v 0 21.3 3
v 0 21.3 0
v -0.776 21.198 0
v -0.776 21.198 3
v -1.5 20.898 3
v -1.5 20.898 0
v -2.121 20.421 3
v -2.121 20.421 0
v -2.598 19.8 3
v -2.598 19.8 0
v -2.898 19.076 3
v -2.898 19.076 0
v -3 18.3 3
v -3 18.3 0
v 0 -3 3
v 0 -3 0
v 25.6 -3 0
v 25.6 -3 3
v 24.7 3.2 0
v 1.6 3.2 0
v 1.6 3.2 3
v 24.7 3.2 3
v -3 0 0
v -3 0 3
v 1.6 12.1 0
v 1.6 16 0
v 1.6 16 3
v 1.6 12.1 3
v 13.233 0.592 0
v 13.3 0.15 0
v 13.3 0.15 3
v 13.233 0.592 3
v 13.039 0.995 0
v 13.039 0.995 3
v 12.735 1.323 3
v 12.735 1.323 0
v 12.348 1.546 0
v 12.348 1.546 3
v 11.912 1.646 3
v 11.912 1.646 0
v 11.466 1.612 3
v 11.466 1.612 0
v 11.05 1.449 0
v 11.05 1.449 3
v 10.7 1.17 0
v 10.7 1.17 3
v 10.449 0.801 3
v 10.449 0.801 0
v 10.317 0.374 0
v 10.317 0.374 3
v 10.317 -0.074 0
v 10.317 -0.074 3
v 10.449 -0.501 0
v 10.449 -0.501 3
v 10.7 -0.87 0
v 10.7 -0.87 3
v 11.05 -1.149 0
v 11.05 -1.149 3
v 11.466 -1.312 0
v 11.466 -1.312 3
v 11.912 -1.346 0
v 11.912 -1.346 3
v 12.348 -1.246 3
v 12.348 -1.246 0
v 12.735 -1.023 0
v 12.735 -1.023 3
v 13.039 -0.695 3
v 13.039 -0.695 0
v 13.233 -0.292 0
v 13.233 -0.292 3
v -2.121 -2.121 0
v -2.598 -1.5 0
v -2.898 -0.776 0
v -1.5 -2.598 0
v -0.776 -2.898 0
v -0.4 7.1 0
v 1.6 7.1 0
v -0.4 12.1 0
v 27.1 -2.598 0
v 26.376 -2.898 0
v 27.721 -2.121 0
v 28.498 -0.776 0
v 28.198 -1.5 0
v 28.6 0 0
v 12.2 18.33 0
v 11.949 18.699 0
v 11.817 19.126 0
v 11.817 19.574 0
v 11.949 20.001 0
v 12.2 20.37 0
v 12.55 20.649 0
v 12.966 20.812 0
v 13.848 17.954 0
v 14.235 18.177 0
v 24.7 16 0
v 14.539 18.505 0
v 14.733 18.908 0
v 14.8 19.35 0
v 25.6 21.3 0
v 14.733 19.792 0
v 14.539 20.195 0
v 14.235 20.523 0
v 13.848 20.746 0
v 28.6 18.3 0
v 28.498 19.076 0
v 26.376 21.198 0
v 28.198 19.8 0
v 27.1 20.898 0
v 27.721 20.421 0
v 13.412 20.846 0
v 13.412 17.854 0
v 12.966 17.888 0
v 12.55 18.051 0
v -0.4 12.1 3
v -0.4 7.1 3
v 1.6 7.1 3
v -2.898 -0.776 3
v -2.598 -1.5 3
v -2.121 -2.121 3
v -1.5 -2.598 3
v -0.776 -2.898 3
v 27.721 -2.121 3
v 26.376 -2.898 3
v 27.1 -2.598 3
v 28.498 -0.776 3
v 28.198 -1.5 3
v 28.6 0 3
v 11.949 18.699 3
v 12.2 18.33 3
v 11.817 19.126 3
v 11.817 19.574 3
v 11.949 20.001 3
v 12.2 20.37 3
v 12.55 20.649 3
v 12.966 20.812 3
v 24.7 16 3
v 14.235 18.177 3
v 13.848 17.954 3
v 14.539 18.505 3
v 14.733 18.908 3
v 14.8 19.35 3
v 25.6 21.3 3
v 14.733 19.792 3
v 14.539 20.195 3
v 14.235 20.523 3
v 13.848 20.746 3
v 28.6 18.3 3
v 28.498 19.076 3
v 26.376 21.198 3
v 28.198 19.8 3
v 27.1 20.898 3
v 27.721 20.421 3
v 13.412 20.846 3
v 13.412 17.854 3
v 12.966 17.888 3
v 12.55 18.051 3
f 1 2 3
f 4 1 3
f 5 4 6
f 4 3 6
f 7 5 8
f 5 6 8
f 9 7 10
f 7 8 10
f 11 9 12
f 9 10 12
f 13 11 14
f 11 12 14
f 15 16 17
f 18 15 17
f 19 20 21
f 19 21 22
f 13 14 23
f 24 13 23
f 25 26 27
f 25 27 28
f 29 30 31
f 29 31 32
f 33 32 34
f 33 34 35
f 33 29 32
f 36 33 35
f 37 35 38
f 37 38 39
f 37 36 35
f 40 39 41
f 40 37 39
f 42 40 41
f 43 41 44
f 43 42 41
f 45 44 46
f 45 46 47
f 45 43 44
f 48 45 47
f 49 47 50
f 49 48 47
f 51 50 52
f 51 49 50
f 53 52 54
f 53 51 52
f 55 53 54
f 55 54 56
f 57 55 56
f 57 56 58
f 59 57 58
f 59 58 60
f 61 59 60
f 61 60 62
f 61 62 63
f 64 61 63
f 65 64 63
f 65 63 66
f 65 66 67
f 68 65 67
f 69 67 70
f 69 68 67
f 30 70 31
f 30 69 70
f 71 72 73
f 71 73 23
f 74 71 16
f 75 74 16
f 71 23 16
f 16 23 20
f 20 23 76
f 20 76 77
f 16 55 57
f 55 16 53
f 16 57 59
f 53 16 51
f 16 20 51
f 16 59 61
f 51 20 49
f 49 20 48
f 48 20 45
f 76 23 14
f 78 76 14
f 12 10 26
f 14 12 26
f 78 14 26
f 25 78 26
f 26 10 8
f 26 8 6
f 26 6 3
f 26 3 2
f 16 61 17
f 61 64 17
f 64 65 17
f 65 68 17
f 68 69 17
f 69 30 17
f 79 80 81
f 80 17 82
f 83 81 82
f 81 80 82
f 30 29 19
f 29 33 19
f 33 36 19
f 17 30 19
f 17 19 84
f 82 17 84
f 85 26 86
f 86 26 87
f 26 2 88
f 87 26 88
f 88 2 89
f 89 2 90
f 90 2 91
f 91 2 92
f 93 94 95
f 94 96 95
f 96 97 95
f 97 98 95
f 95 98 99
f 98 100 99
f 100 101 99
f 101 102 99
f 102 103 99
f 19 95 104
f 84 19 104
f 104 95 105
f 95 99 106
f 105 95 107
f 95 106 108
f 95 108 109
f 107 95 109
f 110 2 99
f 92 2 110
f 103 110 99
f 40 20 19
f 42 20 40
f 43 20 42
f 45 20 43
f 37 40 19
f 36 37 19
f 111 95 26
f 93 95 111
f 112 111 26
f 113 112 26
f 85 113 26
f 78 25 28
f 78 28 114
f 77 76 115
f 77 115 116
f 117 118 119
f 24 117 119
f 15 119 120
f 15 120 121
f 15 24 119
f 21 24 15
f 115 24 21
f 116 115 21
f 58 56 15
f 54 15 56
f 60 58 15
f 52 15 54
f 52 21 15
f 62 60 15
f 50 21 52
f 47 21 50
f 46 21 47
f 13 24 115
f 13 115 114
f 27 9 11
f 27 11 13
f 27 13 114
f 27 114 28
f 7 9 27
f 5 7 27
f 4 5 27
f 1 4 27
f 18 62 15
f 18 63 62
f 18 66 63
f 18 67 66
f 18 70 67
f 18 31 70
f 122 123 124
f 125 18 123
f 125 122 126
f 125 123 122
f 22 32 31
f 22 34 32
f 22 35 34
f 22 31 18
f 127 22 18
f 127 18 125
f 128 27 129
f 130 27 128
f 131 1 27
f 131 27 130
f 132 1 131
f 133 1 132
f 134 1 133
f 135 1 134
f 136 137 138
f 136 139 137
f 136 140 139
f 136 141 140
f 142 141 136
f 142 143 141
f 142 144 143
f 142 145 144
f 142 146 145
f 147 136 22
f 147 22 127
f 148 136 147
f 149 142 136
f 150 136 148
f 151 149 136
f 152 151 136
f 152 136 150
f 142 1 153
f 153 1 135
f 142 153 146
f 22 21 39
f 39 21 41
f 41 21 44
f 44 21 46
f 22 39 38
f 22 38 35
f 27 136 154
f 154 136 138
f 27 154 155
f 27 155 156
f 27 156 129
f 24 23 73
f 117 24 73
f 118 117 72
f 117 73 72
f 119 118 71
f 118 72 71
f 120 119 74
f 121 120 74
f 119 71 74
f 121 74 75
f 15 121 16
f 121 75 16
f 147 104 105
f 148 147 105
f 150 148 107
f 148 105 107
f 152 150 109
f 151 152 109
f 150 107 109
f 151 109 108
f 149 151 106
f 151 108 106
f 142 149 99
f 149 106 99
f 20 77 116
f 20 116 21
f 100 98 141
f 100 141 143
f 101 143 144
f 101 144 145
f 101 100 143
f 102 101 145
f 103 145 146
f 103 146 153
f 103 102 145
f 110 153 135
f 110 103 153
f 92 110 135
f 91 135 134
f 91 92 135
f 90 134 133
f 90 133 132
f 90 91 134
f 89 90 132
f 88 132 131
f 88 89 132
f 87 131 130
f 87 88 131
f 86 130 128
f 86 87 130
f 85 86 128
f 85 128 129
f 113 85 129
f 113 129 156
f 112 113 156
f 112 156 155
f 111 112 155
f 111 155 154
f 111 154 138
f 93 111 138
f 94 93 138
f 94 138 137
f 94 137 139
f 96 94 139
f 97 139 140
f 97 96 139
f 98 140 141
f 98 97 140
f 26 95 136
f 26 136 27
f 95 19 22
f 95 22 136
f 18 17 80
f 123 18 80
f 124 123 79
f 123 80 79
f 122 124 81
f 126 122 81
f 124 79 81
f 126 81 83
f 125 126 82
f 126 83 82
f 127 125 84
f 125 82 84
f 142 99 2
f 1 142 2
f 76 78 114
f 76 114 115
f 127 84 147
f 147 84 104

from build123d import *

# Parameters (mm, degrees)
SKETCH1_R           = 1.5
BOSS_EXTRUDE1_DEPTH = 3


with BuildPart() as part:
    # Sketch1 → Boss-Extrude1 (new body)
    with BuildSketch(Plane.XY):
        with BuildLine():
            Line((28.6, 0), (28.6, 18.3))
            ThreePointArc((28.6, 18.3), (27.721320344, 20.421320344), (25.6, 21.3))
            Line((25.6, 21.3), (0, 21.3))
            ThreePointArc((0, 21.3), (-2.121320344, 20.421320344), (-3, 18.3))
            Line((-3, 18.3), (-3, 0))
            ThreePointArc((-3, 0), (-2.121320344, -2.121320344), (0, -3))
            Line((0, -3), (25.6, -3))
            ThreePointArc((25.6, -3), (27.721320344, -2.121320344), (28.6, 0))
        make_face()
        with Locations((11.8, 0.15)):
            Circle(SKETCH1_R, mode=Mode.SUBTRACT)
        with Locations((13.3, 19.35)):
            Circle(SKETCH1_R, mode=Mode.SUBTRACT)
        Polygon((24.7, 3.2), (24.7, 16), (1.6, 16), (1.6, 12.1), (-0.4, 12.1), (-0.4, 7.1), (1.6, 7.1), (1.6, 3.2), align=None, mode=Mode.SUBTRACT)
    extrude(amount=BOSS_EXTRUDE1_DEPTH)


solid = part.part
